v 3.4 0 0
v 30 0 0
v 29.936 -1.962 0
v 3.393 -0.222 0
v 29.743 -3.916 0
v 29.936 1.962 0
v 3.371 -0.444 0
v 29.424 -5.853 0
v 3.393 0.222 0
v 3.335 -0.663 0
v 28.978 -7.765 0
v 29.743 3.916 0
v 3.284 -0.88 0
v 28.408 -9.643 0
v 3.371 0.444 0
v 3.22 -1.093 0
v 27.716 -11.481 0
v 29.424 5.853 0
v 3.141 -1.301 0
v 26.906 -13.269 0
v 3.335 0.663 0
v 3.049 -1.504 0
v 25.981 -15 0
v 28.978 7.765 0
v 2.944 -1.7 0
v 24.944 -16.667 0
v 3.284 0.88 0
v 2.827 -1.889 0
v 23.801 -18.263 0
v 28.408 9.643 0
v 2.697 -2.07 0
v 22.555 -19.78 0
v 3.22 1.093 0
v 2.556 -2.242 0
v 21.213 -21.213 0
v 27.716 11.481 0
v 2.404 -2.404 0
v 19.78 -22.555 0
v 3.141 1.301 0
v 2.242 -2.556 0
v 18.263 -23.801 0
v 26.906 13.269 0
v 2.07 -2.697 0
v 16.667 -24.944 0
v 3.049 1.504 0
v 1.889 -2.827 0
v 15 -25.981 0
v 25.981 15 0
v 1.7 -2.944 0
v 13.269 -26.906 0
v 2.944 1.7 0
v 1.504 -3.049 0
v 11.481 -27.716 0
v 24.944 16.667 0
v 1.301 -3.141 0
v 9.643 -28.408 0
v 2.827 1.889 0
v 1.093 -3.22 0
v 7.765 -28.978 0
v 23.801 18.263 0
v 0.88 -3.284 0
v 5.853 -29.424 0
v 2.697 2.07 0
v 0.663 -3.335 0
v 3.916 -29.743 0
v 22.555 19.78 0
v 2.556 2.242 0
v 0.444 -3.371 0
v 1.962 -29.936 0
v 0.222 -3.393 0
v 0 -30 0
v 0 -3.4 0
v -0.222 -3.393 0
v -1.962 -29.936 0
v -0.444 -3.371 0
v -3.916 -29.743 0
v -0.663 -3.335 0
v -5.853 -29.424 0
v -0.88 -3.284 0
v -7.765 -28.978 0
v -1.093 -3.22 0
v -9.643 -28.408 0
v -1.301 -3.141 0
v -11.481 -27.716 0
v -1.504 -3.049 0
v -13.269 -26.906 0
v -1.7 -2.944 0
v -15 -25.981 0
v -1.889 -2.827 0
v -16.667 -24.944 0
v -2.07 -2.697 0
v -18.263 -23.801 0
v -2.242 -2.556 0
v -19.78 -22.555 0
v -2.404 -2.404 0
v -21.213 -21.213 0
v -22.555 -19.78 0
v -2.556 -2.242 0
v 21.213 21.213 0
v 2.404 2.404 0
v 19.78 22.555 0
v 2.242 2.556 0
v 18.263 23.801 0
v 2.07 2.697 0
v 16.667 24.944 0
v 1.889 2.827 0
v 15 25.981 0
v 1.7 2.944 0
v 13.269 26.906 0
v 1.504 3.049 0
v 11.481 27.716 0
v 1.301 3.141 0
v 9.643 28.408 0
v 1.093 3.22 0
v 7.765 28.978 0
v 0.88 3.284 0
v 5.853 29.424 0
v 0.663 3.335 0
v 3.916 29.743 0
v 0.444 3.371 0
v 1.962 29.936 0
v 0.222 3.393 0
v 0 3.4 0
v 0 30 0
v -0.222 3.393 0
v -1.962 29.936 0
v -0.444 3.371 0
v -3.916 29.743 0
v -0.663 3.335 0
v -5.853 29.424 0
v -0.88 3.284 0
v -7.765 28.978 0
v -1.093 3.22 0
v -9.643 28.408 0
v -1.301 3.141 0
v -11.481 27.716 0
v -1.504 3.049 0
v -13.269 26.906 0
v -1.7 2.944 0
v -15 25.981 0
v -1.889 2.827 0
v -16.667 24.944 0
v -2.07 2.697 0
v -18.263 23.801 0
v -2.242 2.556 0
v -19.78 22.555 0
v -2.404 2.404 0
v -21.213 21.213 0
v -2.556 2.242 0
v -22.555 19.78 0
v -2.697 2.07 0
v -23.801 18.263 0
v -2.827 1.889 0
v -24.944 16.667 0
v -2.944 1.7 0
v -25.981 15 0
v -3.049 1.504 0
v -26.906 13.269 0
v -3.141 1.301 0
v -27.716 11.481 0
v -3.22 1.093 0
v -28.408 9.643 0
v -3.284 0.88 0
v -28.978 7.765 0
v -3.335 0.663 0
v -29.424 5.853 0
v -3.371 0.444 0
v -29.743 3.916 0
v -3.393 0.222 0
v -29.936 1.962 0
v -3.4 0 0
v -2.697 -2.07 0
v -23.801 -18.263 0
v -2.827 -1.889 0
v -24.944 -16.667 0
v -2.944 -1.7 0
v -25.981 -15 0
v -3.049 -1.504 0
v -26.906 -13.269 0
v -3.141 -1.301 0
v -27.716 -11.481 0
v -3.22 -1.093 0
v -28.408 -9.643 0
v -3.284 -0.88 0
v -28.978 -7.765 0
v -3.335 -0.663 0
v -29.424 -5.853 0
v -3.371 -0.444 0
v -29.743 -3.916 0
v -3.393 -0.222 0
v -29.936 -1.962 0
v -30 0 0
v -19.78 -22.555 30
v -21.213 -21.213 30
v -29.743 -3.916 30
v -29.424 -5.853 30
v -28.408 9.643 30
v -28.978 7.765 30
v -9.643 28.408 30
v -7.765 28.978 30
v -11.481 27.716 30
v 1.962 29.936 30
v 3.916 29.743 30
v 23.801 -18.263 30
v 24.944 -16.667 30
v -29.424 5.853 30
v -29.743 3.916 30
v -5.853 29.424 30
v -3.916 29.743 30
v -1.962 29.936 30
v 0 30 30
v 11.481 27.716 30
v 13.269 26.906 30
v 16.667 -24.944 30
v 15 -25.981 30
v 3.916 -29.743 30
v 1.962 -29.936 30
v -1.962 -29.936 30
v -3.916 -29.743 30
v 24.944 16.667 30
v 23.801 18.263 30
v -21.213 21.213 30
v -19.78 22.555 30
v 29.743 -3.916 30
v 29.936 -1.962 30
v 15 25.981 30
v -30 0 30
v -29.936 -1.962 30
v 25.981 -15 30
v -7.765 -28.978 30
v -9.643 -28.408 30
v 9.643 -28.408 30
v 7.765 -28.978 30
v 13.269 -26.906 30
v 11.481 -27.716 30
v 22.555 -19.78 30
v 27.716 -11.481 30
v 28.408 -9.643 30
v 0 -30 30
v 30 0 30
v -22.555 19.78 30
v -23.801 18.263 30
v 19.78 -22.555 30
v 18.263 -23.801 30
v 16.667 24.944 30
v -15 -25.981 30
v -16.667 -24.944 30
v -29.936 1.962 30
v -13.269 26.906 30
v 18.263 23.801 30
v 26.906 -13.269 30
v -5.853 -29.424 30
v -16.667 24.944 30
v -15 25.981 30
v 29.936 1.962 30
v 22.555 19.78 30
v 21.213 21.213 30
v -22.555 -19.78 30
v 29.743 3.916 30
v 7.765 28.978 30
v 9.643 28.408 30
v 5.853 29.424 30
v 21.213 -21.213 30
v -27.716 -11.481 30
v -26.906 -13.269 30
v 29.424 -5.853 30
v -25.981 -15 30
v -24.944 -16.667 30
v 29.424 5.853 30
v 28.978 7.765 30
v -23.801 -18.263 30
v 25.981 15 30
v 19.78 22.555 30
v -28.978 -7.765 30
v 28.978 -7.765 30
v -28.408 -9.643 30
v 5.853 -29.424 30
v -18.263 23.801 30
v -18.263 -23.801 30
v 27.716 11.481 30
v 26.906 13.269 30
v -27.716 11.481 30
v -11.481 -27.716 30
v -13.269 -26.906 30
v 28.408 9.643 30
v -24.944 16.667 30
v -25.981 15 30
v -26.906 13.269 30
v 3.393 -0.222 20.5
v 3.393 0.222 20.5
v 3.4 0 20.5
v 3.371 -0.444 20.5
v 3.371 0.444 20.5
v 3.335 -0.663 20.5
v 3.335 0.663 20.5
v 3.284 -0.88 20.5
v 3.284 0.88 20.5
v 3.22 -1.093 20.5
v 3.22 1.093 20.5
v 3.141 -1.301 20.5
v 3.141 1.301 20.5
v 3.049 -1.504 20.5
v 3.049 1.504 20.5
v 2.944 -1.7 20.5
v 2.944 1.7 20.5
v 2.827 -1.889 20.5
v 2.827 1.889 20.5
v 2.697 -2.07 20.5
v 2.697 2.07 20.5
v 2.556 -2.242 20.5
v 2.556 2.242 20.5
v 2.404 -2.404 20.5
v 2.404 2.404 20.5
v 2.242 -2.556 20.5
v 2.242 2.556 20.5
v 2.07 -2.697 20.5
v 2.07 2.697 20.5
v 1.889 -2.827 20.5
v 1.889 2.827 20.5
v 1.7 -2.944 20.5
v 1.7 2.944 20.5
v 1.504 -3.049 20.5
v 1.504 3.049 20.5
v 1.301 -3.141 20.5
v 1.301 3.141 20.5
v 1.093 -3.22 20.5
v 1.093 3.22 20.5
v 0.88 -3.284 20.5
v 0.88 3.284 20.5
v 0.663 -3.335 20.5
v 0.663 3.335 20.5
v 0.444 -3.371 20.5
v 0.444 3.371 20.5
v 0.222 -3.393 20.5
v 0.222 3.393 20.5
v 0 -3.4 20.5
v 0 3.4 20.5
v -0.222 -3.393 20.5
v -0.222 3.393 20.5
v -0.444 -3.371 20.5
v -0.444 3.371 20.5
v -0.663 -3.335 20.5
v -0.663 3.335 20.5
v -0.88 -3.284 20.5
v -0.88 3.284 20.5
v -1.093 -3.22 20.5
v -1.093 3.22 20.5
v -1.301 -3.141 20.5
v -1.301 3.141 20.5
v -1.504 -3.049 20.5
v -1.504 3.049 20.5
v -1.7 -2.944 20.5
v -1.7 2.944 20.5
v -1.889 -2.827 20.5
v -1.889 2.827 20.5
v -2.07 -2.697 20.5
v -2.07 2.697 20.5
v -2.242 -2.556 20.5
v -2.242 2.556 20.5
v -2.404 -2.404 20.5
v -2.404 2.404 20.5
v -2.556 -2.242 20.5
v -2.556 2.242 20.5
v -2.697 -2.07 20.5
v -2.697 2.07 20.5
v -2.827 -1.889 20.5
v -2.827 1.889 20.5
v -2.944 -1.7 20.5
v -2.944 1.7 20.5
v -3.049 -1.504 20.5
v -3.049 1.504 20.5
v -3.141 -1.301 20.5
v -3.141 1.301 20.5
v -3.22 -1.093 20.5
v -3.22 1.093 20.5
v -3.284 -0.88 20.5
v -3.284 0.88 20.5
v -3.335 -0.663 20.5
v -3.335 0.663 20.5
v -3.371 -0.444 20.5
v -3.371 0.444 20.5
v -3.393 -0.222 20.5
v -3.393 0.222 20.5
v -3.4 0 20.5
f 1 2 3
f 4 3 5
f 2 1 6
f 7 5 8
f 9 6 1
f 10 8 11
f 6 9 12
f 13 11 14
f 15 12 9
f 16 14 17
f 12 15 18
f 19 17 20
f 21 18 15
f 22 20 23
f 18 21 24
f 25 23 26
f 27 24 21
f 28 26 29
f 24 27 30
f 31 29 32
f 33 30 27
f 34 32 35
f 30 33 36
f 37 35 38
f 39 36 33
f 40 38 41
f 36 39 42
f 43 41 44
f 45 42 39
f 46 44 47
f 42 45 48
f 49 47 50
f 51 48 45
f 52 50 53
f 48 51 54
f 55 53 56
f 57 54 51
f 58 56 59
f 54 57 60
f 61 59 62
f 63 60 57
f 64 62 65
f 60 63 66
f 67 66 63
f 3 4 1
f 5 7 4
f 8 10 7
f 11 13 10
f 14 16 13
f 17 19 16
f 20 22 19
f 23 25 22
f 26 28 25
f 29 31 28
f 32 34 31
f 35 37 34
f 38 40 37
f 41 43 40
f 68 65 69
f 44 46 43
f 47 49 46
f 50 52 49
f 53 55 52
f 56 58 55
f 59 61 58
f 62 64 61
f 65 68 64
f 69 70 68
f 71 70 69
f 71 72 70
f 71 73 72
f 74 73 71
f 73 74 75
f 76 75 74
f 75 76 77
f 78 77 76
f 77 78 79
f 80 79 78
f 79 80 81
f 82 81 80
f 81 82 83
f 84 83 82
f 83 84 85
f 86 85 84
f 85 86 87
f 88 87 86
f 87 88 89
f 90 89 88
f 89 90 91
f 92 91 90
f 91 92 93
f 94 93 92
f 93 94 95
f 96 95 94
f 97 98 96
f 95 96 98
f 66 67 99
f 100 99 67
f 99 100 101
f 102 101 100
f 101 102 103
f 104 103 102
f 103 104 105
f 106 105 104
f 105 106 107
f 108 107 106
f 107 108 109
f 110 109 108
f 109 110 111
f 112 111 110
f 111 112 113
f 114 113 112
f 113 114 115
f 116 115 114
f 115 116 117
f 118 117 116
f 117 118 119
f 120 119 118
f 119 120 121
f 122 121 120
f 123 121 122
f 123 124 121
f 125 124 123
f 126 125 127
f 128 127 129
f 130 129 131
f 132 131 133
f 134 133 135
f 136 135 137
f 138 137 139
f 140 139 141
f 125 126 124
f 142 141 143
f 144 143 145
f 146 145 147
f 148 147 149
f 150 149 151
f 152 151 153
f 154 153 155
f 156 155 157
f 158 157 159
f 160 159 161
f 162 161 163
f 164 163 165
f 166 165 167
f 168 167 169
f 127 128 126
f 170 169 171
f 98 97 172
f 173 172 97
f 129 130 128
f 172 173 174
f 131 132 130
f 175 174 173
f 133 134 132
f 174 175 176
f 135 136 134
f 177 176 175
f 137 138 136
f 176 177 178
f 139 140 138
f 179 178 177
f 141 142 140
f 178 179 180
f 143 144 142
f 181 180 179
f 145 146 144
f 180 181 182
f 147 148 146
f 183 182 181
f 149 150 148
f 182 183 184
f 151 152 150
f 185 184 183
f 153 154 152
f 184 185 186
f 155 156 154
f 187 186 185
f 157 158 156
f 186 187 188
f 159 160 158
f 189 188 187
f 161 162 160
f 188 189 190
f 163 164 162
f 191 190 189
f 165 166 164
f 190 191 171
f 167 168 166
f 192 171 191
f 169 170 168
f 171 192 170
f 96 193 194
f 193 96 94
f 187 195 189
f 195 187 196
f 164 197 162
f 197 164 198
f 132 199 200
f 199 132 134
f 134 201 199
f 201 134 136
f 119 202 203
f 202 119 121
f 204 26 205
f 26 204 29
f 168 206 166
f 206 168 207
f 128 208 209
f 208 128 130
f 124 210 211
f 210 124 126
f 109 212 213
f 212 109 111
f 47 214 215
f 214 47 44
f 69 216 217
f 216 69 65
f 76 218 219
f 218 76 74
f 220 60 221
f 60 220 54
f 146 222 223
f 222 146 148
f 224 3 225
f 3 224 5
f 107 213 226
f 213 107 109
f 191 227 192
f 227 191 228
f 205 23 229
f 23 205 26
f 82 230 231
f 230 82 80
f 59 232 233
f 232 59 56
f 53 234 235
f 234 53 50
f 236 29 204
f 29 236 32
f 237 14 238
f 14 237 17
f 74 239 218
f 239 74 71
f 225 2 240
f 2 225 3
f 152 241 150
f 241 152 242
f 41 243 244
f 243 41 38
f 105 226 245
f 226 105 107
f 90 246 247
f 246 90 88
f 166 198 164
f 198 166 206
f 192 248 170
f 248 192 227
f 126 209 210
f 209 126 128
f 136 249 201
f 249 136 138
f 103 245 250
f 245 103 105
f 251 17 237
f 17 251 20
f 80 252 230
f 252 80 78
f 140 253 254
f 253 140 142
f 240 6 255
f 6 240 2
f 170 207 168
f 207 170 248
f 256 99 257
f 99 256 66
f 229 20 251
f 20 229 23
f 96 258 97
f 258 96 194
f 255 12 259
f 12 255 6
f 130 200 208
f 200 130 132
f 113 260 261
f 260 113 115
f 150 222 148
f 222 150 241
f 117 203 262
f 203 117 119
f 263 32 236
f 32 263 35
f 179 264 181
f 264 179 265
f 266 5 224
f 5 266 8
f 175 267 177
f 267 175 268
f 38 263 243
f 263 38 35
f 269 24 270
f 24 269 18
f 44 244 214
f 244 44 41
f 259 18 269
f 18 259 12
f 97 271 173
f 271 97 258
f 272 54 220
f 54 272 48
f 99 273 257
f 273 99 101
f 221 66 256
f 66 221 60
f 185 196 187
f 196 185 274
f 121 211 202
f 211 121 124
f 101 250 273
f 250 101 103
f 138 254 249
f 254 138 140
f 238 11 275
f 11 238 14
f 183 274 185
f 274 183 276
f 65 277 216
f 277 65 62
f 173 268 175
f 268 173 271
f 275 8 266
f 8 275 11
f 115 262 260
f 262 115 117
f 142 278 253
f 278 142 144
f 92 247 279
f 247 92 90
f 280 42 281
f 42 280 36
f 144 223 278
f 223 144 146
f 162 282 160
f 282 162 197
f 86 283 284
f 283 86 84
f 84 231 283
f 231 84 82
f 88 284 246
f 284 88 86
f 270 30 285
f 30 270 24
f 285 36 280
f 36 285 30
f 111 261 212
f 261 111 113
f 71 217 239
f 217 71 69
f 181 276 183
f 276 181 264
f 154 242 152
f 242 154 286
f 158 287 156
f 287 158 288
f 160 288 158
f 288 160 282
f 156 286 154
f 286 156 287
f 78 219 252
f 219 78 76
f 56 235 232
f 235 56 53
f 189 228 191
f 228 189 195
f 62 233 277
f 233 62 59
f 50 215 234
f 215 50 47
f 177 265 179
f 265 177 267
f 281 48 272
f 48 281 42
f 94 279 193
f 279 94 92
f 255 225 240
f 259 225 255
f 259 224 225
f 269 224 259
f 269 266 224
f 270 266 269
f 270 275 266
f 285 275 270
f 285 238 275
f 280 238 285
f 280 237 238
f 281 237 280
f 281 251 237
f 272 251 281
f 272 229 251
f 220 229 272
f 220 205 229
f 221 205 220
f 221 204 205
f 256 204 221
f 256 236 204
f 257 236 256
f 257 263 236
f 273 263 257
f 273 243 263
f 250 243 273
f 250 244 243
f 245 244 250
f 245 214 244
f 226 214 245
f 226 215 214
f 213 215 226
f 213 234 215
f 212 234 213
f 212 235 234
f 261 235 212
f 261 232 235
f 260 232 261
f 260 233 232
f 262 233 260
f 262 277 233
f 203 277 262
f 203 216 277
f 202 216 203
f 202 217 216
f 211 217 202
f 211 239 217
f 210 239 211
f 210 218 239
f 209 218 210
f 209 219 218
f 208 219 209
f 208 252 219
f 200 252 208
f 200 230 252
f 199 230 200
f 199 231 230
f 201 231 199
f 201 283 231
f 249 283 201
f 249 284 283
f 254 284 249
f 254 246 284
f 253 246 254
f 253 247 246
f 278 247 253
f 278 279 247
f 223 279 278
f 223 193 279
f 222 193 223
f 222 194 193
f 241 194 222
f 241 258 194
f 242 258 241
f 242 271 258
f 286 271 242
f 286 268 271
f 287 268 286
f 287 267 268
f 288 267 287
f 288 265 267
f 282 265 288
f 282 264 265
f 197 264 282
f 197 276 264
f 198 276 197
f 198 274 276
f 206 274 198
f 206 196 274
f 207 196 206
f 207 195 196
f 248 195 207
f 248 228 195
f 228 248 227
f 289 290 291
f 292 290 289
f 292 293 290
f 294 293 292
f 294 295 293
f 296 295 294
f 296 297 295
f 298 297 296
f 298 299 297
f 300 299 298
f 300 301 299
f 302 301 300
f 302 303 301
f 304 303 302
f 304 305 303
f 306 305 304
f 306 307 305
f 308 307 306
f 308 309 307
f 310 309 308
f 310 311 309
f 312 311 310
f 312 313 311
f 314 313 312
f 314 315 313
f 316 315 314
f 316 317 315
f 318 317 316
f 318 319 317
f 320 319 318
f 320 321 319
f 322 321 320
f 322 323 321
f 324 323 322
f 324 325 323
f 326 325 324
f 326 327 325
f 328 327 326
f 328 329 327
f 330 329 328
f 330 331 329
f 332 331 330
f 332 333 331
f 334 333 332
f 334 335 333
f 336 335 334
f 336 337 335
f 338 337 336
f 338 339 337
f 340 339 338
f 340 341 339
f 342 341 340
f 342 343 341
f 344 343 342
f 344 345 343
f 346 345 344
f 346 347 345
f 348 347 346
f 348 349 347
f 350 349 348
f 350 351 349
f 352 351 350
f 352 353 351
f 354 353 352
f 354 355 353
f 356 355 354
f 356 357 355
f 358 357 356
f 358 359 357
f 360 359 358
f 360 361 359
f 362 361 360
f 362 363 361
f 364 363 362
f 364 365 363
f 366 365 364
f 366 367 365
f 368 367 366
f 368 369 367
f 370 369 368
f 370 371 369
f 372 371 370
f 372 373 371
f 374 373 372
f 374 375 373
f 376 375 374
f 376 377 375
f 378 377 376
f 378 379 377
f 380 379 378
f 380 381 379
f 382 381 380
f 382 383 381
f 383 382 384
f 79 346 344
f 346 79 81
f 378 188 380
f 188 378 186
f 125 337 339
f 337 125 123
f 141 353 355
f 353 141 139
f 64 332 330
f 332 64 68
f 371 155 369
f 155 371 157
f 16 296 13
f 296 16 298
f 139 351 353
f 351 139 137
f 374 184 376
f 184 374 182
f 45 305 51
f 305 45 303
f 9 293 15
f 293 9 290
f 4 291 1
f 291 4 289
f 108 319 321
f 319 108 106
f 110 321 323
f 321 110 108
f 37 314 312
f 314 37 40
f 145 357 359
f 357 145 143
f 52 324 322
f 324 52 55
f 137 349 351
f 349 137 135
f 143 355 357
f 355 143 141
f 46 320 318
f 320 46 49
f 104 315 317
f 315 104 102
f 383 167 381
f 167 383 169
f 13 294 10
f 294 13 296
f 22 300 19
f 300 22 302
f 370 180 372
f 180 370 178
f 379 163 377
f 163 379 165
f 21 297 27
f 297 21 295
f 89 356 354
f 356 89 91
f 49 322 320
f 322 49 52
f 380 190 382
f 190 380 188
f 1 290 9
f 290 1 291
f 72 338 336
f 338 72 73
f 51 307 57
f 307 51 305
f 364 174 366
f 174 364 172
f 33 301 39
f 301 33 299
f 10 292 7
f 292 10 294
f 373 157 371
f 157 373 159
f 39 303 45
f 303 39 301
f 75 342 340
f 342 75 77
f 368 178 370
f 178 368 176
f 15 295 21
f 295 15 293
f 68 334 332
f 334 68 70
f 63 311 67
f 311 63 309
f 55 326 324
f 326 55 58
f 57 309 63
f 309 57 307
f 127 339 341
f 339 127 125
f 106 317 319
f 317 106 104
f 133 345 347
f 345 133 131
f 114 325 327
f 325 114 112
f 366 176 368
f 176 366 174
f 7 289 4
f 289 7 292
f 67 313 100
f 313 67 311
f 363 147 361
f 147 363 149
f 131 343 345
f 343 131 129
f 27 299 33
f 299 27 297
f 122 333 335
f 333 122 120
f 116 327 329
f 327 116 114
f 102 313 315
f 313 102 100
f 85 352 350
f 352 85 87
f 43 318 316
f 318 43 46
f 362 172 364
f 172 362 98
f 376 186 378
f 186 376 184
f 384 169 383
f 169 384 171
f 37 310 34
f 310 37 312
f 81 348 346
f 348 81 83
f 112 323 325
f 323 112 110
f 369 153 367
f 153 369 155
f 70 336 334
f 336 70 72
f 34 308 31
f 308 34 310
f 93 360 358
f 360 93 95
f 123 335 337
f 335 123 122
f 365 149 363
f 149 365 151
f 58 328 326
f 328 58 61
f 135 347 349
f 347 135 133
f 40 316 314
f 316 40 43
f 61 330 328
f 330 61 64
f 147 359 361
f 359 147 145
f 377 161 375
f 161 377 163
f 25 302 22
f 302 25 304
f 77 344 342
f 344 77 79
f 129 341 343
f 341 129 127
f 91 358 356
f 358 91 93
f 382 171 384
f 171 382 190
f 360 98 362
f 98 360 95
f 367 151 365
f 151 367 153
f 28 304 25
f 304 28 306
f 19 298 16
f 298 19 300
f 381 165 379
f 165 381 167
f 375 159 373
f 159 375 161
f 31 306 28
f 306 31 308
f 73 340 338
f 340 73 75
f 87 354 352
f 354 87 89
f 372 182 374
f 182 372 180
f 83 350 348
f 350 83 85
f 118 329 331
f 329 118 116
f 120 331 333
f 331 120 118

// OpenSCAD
// Small lab funnel - printed upright, open top and bottom
// Units: mm. Wall thickness 1.6 mm throughout.

$fn = 96;

// ---- Dimensions ----
spout_od      = 10;    // spout outer diameter (z = 0 to 20)
spout_len     = 20;    // spout length (z = 0 to 20)
cone_bottom_d = 10;    // cone outer diameter at z = 20
cone_top_d    = 60;    // cone outer diameter at rim (z = 50)
wall          = 1.6;   // wall thickness
eps           = 0.5;   // cutter overshoot past faces

// ---- Derived ----
spout_id = spout_od - 2 * wall;   // bore diameter (6.8 mm)
cone_h   = 50 - 20;               // cone height (30 mm)

difference() {
    union() {
        // Spout (tube)
        cylinder(d = spout_od, h = spout_len);

        // Cone: hull between spout top and rim
        hull() {
            translate([0, 0, spout_len])
                cylinder(d = cone_bottom_d, h = 0.01);
            cylinder(d = cone_top_d, h = cone_h);
        }
    }

    // Bottom outlet bore (through spout)
    translate([0, 0, -eps])
        cylinder(d = spout_id, h = spout_len + 2 * eps);

    // Rim: open top, no lid
    translate([0, 0, 50])
        cylinder(d = cone_top_d + 2 * wall, h = eps);
}
